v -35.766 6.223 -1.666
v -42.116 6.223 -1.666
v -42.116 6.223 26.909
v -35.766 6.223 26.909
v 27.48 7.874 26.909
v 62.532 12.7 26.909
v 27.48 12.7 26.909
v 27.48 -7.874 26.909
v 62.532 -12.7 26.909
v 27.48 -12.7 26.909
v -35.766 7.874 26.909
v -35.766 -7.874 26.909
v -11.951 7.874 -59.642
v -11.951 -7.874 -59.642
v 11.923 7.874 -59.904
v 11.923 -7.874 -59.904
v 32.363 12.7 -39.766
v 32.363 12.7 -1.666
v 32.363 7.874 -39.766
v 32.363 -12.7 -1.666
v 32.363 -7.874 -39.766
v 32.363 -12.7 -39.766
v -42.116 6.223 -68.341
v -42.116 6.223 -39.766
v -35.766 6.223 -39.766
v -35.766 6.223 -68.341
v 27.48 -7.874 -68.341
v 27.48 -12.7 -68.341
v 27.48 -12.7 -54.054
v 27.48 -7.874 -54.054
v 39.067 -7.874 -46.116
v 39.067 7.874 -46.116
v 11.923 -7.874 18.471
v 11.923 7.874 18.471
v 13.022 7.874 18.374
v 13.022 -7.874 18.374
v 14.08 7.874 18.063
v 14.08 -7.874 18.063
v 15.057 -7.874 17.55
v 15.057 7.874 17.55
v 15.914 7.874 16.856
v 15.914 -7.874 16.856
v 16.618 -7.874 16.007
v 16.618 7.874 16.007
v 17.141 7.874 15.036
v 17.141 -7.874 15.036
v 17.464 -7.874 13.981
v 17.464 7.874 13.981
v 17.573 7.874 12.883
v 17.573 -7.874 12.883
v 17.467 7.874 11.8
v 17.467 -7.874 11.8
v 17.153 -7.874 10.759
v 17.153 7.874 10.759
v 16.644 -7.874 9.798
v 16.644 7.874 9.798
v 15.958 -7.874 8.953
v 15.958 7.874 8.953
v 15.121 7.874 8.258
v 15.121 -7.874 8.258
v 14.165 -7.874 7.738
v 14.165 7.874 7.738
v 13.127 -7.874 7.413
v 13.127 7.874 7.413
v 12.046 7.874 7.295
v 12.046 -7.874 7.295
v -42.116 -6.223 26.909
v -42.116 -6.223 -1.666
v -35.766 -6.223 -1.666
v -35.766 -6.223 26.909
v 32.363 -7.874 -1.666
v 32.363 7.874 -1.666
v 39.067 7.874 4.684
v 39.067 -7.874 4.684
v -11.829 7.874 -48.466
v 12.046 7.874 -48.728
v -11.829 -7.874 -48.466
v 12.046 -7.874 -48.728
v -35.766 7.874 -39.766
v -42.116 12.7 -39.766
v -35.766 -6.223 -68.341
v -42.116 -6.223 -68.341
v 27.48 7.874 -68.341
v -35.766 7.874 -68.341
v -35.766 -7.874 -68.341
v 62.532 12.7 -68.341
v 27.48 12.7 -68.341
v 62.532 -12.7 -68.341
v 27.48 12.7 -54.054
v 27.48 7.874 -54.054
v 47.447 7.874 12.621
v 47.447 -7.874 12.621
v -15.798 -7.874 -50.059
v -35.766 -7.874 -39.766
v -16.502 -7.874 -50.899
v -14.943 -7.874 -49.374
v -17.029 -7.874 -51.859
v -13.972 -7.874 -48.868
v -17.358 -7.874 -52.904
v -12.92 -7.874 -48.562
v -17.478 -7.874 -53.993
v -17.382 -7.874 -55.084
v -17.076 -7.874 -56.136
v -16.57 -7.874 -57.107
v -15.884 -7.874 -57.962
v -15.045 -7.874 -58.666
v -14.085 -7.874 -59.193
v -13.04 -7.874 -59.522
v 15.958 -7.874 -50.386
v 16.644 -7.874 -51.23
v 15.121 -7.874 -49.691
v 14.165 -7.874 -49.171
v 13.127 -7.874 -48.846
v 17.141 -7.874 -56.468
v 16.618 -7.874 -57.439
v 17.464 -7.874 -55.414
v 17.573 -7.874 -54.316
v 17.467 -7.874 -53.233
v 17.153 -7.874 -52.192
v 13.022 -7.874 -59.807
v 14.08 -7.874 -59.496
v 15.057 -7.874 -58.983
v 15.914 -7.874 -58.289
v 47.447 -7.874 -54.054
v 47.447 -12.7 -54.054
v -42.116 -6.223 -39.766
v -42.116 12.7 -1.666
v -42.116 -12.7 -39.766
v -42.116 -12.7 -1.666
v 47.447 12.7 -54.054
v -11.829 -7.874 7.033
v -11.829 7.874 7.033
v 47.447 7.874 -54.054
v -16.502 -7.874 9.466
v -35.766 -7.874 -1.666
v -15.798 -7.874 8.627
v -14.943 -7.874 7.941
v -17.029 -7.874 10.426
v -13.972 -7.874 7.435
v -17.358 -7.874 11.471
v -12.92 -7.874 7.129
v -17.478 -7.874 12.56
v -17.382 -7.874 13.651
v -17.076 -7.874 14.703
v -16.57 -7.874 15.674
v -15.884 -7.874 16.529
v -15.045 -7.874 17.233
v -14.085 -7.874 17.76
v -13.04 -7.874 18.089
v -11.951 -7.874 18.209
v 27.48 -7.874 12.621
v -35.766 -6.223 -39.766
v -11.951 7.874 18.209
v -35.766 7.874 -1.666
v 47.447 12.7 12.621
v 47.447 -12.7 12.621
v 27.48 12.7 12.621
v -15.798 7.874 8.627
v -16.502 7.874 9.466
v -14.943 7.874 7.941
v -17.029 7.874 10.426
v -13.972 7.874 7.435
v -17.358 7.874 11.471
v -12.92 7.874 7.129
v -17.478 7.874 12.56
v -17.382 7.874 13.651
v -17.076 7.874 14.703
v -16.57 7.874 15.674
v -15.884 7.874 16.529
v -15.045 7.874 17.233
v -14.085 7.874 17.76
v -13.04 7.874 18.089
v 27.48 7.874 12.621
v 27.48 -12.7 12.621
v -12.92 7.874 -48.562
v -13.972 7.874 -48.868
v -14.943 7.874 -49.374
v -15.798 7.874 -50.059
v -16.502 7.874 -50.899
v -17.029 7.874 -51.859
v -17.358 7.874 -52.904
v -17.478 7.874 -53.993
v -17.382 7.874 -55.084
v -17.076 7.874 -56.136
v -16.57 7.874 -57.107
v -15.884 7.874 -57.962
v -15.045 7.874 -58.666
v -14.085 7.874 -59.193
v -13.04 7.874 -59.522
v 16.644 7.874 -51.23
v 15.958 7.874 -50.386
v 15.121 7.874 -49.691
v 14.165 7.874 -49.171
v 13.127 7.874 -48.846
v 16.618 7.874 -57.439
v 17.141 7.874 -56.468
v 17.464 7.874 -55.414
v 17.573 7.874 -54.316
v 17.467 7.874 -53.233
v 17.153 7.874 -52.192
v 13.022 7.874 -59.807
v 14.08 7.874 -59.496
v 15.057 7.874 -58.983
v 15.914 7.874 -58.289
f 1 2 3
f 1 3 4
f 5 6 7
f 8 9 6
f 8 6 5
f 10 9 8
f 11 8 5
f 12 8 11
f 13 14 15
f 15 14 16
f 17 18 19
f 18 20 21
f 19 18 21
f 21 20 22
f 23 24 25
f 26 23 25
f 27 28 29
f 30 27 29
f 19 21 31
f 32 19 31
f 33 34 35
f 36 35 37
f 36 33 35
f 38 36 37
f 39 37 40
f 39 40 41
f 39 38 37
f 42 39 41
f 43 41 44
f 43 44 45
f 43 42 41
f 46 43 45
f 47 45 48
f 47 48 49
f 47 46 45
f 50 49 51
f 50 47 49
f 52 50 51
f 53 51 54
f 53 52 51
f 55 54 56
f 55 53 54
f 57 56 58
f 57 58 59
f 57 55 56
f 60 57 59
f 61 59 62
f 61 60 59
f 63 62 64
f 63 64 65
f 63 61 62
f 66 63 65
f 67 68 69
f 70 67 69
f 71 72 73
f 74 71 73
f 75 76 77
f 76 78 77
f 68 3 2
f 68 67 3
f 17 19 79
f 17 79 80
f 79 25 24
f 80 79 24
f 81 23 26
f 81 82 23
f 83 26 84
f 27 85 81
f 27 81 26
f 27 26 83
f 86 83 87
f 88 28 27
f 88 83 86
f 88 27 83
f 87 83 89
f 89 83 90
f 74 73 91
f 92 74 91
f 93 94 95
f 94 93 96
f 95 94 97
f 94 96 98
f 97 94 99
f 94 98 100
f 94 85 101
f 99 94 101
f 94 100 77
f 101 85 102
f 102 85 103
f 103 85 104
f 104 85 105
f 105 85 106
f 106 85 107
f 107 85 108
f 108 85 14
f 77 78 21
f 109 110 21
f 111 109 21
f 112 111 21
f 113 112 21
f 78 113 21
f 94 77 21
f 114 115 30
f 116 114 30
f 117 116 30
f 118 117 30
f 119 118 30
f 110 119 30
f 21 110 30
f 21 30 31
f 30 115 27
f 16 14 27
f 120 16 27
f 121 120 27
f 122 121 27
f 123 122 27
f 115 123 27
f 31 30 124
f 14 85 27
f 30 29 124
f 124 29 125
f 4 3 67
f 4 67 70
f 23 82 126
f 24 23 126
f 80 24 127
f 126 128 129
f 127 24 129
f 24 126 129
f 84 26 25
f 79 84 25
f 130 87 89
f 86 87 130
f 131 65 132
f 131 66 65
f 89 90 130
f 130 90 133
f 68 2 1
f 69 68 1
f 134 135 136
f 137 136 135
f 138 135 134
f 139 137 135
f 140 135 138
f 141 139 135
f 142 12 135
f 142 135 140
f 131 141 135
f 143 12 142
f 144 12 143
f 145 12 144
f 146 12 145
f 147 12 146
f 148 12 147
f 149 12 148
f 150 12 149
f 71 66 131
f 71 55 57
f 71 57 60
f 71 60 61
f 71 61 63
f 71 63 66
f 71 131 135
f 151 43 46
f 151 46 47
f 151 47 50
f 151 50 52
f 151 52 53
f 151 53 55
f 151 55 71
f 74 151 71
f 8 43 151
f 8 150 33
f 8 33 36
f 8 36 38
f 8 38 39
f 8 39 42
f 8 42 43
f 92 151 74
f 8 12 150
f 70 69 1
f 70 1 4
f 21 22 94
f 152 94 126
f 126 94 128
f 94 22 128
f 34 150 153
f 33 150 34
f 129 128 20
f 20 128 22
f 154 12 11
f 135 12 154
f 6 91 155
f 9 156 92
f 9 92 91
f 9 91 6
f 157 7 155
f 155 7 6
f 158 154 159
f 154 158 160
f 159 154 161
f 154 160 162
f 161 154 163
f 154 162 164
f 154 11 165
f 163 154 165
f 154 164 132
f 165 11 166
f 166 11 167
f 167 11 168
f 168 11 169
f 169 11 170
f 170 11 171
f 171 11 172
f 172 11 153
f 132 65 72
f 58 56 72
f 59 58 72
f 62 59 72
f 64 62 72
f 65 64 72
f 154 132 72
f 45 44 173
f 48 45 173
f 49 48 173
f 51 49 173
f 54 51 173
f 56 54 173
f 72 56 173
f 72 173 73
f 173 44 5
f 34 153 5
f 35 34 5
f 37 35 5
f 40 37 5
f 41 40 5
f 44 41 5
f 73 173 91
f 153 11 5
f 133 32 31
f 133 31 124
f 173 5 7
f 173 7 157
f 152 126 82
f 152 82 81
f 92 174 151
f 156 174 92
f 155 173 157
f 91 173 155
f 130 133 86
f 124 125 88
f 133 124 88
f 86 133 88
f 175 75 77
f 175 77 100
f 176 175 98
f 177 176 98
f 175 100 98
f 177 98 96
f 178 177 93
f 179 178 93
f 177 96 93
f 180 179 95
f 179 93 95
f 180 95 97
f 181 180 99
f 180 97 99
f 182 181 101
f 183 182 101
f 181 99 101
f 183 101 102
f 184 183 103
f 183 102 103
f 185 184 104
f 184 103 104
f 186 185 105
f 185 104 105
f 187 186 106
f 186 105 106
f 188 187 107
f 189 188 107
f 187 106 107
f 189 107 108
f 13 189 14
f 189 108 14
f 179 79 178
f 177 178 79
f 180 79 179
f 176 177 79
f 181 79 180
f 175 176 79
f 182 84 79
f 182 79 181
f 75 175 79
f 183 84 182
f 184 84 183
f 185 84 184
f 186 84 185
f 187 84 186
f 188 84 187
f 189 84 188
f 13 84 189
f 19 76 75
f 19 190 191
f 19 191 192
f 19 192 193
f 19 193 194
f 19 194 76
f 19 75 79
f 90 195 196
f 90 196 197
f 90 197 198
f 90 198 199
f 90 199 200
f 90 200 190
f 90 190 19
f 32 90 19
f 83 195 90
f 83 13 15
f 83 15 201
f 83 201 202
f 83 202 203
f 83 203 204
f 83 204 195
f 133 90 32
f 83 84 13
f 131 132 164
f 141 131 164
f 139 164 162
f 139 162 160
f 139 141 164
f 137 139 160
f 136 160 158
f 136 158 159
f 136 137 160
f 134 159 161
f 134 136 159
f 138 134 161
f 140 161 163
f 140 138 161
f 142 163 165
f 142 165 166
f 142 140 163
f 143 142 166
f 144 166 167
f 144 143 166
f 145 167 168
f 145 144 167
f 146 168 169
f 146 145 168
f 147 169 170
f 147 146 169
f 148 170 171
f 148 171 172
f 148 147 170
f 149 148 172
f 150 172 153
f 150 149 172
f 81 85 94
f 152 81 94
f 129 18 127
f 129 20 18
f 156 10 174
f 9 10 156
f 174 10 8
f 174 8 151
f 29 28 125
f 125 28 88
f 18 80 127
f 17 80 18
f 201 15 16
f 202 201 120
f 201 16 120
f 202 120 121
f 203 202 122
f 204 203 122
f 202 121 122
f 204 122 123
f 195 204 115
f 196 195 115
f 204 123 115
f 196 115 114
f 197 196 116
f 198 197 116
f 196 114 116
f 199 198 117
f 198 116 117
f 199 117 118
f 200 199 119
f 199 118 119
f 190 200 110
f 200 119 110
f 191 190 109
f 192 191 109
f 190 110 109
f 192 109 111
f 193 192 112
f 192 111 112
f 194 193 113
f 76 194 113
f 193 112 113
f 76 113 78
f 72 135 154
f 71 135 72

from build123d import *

# Parameters (mm, degrees)
F1_DEPTH = 12.7
F2_DEPTH = 7.874
F0_W     = 6.35
F0_H     = 22.225
F0_H_2   = 6.35
F3_DEPTH = 6.223


with BuildPart() as f1:
    # F0 (on Front) → F1 (new body, symmetric)
    with BuildSketch(Plane.XZ):
        Polygon((62.5320133061, 26.9085878074), (27.4800133061, 26.9085878074), (27.4800133061, 12.6210878074), (47.4474663035, 12.6210878074), align=None)
    extrude(amount=F1_DEPTH, both=True)

    # F0 (on Front) → F2 (join, symmetric)
    with BuildSketch(Plane.XZ):
        Polygon((27.4800133061, 26.9085878074), (-35.7659866939, 26.9085878074), (-35.7659866939, 4.6835878074), (39.0671624131, 4.6835878074), (47.4474663035, 12.6210878074), (27.4800133061, 12.6210878074), align=None)
        with BuildLine():
            ThreePointArc((-11.8286832659, 7.0334240837), (-17.4776504176, 12.5597843794), (-11.9512901219, 18.2087515312))
            Line((-11.9512901219, 18.2087515312), (11.9232730614, 18.4706843599))
            ThreePointArc((11.9232730614, 18.4706843599), (15.9141553755, 16.8559482441), (17.5725764894, 12.8830206361))
            ThreePointArc((17.5725764894, 12.8830206361), (15.9575040974, 8.95344175), (12.0458799174, 7.2953569124))
            Line((12.0458799174, 7.2953569124), (-11.8286832659, 7.0334240837))
        make_face(mode=Mode.SUBTRACT)
        Polygon((39.0671624131, 4.6835878074), (-35.7659866939, 4.6835878074), (-35.7659866939, -1.6664121926), (32.3629193008, -1.6664121926), align=None)
    extrude(amount=F2_DEPTH, both=True)


with BuildPart() as f1b:
    # F0 (on Front) → F1, piece 2 (new body, symmetric)
    with BuildSketch(Plane.XZ):
        Polygon((-35.7659866939, -1.6664121926), (-42.1159866939, -1.6664121926), (-42.1159866939, -20.7164121926), (32.3629193008, -20.7164121926), (32.3629193008, -1.6664121926), align=None)
    extrude(amount=F1_DEPTH, both=True)



with BuildPart() as f3:
    # F0 (on Front) → F3 (new body, symmetric)
    with BuildSketch(Plane.XZ):
        with Locations((-38.9409866939, 15.7960878074)):
            Rectangle(F0_W, F0_H)
        with Locations((-38.9409866939, 1.5085878074)):
            Rectangle(F0_W, F0_H_2)
    extrude(amount=F3_DEPTH, both=True)


with BuildPart() as f1b_1:
    add(f1b.part)
    # F4: F1, F1b, F3 across face
    add(f1.part.mirror(Plane(origin=(-4.8765336965, 0, -20.7164121926), x_dir=(1, 0, 0), z_dir=(0, 0, -1))))
    add(f1b.part.mirror(Plane(origin=(-4.8765336965, 0, -20.7164121926), x_dir=(1, 0, 0), z_dir=(0, 0, -1))))
    add(f3.part.mirror(Plane(origin=(-4.8765336965, 0, -20.7164121926), x_dir=(1, 0, 0), z_dir=(0, 0, -1))))


solid = Compound([f1.part, f3.part, f1b_1.part])
